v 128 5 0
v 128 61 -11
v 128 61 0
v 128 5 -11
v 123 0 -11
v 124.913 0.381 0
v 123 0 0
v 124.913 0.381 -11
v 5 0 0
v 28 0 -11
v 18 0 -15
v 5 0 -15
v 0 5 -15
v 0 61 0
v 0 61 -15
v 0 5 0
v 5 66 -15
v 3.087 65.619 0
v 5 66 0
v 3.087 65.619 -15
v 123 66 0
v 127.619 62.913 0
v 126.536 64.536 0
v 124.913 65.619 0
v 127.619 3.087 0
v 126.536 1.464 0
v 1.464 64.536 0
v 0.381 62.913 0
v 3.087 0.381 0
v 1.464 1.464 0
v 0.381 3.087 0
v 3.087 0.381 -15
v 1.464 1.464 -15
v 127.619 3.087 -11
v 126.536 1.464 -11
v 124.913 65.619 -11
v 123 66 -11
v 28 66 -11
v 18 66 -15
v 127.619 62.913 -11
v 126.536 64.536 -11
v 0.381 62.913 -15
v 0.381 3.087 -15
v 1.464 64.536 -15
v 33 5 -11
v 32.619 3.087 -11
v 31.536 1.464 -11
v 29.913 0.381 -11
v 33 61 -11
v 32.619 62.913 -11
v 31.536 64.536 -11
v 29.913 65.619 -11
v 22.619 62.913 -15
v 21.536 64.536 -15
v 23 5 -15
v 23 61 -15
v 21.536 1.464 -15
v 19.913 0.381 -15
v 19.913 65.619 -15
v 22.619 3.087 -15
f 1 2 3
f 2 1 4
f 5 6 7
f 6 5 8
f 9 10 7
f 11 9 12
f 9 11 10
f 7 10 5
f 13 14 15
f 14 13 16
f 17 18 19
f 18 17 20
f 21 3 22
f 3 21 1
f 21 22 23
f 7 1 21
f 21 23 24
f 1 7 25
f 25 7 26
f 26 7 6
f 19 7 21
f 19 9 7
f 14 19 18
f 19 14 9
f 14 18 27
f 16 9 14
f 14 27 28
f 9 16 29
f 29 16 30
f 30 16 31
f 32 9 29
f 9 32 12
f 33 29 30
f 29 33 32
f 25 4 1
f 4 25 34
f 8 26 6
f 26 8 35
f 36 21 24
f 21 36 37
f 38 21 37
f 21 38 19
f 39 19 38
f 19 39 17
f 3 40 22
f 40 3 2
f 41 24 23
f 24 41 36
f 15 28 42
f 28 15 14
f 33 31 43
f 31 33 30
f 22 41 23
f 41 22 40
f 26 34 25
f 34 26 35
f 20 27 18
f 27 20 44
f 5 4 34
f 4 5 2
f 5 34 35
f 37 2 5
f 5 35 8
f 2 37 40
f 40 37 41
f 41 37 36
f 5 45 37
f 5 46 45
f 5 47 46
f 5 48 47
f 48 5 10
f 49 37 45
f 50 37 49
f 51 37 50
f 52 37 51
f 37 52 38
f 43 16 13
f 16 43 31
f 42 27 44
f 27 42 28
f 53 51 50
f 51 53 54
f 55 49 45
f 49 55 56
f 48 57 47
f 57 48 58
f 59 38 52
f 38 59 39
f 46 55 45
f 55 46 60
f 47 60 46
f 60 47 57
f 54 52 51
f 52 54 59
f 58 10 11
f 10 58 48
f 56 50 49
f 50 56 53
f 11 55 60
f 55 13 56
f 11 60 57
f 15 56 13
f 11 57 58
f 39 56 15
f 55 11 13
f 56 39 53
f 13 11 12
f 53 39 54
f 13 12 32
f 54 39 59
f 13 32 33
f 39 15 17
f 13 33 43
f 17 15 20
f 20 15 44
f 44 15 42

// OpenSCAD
// Origin of phone is bottom left corner of screen face (slightly off of phone
// due to round bezels)
// X axis is long dimension, Y axis is short dimension, Z is thickness

phone_length = 128;
phone_width = 66;
phone_thickness = 11;
phone_bulge_thickness = 15;
phone_bulge_length = 33;
phone_corner_radius = 5;
phone_bulge_ramp = 10;

phone_camera_x = 10;
phone_camera_y = 45;
phone_camera_z = -phone_bulge_thickness;

module phone_corner() {
    translate([0, 0, -phone_thickness]) cylinder(r=phone_corner_radius, h=phone_thickness);
}
module phone_bulge_corner() {
    translate([0, 0, -phone_bulge_thickness]) {
        cylinder(r=phone_corner_radius, h=phone_thickness);
    }
}

module phone() {
    r = phone_corner_radius;
    width = phone_width;
    length = phone_length;
    thickness = phone_thickness;
    bulge_length = phone_bulge_length;
    bulge_ramp = phone_bulge_ramp;
    hull() {
        translate([r, r, 0]) phone_corner();
        translate([length - r, r, 0]) phone_corner();
        translate([length - r, width - r, 0]) phone_corner();
        translate([r, width - r, 0]) phone_corner();
    }
    hull() {
        translate([r, r, 0]) phone_bulge_corner();
        translate([bulge_length - bulge_ramp - r, r, 0]) phone_bulge_corner();
        translate([bulge_length - bulge_ramp - r, width - r, 0]) phone_bulge_corner();
        translate([r, width - r, 0]) phone_bulge_corner();
        translate([bulge_length - r, r, 0]) phone_corner();
        translate([bulge_length - r, width - r, 0]) phone_corner();
    }
}

phone();
